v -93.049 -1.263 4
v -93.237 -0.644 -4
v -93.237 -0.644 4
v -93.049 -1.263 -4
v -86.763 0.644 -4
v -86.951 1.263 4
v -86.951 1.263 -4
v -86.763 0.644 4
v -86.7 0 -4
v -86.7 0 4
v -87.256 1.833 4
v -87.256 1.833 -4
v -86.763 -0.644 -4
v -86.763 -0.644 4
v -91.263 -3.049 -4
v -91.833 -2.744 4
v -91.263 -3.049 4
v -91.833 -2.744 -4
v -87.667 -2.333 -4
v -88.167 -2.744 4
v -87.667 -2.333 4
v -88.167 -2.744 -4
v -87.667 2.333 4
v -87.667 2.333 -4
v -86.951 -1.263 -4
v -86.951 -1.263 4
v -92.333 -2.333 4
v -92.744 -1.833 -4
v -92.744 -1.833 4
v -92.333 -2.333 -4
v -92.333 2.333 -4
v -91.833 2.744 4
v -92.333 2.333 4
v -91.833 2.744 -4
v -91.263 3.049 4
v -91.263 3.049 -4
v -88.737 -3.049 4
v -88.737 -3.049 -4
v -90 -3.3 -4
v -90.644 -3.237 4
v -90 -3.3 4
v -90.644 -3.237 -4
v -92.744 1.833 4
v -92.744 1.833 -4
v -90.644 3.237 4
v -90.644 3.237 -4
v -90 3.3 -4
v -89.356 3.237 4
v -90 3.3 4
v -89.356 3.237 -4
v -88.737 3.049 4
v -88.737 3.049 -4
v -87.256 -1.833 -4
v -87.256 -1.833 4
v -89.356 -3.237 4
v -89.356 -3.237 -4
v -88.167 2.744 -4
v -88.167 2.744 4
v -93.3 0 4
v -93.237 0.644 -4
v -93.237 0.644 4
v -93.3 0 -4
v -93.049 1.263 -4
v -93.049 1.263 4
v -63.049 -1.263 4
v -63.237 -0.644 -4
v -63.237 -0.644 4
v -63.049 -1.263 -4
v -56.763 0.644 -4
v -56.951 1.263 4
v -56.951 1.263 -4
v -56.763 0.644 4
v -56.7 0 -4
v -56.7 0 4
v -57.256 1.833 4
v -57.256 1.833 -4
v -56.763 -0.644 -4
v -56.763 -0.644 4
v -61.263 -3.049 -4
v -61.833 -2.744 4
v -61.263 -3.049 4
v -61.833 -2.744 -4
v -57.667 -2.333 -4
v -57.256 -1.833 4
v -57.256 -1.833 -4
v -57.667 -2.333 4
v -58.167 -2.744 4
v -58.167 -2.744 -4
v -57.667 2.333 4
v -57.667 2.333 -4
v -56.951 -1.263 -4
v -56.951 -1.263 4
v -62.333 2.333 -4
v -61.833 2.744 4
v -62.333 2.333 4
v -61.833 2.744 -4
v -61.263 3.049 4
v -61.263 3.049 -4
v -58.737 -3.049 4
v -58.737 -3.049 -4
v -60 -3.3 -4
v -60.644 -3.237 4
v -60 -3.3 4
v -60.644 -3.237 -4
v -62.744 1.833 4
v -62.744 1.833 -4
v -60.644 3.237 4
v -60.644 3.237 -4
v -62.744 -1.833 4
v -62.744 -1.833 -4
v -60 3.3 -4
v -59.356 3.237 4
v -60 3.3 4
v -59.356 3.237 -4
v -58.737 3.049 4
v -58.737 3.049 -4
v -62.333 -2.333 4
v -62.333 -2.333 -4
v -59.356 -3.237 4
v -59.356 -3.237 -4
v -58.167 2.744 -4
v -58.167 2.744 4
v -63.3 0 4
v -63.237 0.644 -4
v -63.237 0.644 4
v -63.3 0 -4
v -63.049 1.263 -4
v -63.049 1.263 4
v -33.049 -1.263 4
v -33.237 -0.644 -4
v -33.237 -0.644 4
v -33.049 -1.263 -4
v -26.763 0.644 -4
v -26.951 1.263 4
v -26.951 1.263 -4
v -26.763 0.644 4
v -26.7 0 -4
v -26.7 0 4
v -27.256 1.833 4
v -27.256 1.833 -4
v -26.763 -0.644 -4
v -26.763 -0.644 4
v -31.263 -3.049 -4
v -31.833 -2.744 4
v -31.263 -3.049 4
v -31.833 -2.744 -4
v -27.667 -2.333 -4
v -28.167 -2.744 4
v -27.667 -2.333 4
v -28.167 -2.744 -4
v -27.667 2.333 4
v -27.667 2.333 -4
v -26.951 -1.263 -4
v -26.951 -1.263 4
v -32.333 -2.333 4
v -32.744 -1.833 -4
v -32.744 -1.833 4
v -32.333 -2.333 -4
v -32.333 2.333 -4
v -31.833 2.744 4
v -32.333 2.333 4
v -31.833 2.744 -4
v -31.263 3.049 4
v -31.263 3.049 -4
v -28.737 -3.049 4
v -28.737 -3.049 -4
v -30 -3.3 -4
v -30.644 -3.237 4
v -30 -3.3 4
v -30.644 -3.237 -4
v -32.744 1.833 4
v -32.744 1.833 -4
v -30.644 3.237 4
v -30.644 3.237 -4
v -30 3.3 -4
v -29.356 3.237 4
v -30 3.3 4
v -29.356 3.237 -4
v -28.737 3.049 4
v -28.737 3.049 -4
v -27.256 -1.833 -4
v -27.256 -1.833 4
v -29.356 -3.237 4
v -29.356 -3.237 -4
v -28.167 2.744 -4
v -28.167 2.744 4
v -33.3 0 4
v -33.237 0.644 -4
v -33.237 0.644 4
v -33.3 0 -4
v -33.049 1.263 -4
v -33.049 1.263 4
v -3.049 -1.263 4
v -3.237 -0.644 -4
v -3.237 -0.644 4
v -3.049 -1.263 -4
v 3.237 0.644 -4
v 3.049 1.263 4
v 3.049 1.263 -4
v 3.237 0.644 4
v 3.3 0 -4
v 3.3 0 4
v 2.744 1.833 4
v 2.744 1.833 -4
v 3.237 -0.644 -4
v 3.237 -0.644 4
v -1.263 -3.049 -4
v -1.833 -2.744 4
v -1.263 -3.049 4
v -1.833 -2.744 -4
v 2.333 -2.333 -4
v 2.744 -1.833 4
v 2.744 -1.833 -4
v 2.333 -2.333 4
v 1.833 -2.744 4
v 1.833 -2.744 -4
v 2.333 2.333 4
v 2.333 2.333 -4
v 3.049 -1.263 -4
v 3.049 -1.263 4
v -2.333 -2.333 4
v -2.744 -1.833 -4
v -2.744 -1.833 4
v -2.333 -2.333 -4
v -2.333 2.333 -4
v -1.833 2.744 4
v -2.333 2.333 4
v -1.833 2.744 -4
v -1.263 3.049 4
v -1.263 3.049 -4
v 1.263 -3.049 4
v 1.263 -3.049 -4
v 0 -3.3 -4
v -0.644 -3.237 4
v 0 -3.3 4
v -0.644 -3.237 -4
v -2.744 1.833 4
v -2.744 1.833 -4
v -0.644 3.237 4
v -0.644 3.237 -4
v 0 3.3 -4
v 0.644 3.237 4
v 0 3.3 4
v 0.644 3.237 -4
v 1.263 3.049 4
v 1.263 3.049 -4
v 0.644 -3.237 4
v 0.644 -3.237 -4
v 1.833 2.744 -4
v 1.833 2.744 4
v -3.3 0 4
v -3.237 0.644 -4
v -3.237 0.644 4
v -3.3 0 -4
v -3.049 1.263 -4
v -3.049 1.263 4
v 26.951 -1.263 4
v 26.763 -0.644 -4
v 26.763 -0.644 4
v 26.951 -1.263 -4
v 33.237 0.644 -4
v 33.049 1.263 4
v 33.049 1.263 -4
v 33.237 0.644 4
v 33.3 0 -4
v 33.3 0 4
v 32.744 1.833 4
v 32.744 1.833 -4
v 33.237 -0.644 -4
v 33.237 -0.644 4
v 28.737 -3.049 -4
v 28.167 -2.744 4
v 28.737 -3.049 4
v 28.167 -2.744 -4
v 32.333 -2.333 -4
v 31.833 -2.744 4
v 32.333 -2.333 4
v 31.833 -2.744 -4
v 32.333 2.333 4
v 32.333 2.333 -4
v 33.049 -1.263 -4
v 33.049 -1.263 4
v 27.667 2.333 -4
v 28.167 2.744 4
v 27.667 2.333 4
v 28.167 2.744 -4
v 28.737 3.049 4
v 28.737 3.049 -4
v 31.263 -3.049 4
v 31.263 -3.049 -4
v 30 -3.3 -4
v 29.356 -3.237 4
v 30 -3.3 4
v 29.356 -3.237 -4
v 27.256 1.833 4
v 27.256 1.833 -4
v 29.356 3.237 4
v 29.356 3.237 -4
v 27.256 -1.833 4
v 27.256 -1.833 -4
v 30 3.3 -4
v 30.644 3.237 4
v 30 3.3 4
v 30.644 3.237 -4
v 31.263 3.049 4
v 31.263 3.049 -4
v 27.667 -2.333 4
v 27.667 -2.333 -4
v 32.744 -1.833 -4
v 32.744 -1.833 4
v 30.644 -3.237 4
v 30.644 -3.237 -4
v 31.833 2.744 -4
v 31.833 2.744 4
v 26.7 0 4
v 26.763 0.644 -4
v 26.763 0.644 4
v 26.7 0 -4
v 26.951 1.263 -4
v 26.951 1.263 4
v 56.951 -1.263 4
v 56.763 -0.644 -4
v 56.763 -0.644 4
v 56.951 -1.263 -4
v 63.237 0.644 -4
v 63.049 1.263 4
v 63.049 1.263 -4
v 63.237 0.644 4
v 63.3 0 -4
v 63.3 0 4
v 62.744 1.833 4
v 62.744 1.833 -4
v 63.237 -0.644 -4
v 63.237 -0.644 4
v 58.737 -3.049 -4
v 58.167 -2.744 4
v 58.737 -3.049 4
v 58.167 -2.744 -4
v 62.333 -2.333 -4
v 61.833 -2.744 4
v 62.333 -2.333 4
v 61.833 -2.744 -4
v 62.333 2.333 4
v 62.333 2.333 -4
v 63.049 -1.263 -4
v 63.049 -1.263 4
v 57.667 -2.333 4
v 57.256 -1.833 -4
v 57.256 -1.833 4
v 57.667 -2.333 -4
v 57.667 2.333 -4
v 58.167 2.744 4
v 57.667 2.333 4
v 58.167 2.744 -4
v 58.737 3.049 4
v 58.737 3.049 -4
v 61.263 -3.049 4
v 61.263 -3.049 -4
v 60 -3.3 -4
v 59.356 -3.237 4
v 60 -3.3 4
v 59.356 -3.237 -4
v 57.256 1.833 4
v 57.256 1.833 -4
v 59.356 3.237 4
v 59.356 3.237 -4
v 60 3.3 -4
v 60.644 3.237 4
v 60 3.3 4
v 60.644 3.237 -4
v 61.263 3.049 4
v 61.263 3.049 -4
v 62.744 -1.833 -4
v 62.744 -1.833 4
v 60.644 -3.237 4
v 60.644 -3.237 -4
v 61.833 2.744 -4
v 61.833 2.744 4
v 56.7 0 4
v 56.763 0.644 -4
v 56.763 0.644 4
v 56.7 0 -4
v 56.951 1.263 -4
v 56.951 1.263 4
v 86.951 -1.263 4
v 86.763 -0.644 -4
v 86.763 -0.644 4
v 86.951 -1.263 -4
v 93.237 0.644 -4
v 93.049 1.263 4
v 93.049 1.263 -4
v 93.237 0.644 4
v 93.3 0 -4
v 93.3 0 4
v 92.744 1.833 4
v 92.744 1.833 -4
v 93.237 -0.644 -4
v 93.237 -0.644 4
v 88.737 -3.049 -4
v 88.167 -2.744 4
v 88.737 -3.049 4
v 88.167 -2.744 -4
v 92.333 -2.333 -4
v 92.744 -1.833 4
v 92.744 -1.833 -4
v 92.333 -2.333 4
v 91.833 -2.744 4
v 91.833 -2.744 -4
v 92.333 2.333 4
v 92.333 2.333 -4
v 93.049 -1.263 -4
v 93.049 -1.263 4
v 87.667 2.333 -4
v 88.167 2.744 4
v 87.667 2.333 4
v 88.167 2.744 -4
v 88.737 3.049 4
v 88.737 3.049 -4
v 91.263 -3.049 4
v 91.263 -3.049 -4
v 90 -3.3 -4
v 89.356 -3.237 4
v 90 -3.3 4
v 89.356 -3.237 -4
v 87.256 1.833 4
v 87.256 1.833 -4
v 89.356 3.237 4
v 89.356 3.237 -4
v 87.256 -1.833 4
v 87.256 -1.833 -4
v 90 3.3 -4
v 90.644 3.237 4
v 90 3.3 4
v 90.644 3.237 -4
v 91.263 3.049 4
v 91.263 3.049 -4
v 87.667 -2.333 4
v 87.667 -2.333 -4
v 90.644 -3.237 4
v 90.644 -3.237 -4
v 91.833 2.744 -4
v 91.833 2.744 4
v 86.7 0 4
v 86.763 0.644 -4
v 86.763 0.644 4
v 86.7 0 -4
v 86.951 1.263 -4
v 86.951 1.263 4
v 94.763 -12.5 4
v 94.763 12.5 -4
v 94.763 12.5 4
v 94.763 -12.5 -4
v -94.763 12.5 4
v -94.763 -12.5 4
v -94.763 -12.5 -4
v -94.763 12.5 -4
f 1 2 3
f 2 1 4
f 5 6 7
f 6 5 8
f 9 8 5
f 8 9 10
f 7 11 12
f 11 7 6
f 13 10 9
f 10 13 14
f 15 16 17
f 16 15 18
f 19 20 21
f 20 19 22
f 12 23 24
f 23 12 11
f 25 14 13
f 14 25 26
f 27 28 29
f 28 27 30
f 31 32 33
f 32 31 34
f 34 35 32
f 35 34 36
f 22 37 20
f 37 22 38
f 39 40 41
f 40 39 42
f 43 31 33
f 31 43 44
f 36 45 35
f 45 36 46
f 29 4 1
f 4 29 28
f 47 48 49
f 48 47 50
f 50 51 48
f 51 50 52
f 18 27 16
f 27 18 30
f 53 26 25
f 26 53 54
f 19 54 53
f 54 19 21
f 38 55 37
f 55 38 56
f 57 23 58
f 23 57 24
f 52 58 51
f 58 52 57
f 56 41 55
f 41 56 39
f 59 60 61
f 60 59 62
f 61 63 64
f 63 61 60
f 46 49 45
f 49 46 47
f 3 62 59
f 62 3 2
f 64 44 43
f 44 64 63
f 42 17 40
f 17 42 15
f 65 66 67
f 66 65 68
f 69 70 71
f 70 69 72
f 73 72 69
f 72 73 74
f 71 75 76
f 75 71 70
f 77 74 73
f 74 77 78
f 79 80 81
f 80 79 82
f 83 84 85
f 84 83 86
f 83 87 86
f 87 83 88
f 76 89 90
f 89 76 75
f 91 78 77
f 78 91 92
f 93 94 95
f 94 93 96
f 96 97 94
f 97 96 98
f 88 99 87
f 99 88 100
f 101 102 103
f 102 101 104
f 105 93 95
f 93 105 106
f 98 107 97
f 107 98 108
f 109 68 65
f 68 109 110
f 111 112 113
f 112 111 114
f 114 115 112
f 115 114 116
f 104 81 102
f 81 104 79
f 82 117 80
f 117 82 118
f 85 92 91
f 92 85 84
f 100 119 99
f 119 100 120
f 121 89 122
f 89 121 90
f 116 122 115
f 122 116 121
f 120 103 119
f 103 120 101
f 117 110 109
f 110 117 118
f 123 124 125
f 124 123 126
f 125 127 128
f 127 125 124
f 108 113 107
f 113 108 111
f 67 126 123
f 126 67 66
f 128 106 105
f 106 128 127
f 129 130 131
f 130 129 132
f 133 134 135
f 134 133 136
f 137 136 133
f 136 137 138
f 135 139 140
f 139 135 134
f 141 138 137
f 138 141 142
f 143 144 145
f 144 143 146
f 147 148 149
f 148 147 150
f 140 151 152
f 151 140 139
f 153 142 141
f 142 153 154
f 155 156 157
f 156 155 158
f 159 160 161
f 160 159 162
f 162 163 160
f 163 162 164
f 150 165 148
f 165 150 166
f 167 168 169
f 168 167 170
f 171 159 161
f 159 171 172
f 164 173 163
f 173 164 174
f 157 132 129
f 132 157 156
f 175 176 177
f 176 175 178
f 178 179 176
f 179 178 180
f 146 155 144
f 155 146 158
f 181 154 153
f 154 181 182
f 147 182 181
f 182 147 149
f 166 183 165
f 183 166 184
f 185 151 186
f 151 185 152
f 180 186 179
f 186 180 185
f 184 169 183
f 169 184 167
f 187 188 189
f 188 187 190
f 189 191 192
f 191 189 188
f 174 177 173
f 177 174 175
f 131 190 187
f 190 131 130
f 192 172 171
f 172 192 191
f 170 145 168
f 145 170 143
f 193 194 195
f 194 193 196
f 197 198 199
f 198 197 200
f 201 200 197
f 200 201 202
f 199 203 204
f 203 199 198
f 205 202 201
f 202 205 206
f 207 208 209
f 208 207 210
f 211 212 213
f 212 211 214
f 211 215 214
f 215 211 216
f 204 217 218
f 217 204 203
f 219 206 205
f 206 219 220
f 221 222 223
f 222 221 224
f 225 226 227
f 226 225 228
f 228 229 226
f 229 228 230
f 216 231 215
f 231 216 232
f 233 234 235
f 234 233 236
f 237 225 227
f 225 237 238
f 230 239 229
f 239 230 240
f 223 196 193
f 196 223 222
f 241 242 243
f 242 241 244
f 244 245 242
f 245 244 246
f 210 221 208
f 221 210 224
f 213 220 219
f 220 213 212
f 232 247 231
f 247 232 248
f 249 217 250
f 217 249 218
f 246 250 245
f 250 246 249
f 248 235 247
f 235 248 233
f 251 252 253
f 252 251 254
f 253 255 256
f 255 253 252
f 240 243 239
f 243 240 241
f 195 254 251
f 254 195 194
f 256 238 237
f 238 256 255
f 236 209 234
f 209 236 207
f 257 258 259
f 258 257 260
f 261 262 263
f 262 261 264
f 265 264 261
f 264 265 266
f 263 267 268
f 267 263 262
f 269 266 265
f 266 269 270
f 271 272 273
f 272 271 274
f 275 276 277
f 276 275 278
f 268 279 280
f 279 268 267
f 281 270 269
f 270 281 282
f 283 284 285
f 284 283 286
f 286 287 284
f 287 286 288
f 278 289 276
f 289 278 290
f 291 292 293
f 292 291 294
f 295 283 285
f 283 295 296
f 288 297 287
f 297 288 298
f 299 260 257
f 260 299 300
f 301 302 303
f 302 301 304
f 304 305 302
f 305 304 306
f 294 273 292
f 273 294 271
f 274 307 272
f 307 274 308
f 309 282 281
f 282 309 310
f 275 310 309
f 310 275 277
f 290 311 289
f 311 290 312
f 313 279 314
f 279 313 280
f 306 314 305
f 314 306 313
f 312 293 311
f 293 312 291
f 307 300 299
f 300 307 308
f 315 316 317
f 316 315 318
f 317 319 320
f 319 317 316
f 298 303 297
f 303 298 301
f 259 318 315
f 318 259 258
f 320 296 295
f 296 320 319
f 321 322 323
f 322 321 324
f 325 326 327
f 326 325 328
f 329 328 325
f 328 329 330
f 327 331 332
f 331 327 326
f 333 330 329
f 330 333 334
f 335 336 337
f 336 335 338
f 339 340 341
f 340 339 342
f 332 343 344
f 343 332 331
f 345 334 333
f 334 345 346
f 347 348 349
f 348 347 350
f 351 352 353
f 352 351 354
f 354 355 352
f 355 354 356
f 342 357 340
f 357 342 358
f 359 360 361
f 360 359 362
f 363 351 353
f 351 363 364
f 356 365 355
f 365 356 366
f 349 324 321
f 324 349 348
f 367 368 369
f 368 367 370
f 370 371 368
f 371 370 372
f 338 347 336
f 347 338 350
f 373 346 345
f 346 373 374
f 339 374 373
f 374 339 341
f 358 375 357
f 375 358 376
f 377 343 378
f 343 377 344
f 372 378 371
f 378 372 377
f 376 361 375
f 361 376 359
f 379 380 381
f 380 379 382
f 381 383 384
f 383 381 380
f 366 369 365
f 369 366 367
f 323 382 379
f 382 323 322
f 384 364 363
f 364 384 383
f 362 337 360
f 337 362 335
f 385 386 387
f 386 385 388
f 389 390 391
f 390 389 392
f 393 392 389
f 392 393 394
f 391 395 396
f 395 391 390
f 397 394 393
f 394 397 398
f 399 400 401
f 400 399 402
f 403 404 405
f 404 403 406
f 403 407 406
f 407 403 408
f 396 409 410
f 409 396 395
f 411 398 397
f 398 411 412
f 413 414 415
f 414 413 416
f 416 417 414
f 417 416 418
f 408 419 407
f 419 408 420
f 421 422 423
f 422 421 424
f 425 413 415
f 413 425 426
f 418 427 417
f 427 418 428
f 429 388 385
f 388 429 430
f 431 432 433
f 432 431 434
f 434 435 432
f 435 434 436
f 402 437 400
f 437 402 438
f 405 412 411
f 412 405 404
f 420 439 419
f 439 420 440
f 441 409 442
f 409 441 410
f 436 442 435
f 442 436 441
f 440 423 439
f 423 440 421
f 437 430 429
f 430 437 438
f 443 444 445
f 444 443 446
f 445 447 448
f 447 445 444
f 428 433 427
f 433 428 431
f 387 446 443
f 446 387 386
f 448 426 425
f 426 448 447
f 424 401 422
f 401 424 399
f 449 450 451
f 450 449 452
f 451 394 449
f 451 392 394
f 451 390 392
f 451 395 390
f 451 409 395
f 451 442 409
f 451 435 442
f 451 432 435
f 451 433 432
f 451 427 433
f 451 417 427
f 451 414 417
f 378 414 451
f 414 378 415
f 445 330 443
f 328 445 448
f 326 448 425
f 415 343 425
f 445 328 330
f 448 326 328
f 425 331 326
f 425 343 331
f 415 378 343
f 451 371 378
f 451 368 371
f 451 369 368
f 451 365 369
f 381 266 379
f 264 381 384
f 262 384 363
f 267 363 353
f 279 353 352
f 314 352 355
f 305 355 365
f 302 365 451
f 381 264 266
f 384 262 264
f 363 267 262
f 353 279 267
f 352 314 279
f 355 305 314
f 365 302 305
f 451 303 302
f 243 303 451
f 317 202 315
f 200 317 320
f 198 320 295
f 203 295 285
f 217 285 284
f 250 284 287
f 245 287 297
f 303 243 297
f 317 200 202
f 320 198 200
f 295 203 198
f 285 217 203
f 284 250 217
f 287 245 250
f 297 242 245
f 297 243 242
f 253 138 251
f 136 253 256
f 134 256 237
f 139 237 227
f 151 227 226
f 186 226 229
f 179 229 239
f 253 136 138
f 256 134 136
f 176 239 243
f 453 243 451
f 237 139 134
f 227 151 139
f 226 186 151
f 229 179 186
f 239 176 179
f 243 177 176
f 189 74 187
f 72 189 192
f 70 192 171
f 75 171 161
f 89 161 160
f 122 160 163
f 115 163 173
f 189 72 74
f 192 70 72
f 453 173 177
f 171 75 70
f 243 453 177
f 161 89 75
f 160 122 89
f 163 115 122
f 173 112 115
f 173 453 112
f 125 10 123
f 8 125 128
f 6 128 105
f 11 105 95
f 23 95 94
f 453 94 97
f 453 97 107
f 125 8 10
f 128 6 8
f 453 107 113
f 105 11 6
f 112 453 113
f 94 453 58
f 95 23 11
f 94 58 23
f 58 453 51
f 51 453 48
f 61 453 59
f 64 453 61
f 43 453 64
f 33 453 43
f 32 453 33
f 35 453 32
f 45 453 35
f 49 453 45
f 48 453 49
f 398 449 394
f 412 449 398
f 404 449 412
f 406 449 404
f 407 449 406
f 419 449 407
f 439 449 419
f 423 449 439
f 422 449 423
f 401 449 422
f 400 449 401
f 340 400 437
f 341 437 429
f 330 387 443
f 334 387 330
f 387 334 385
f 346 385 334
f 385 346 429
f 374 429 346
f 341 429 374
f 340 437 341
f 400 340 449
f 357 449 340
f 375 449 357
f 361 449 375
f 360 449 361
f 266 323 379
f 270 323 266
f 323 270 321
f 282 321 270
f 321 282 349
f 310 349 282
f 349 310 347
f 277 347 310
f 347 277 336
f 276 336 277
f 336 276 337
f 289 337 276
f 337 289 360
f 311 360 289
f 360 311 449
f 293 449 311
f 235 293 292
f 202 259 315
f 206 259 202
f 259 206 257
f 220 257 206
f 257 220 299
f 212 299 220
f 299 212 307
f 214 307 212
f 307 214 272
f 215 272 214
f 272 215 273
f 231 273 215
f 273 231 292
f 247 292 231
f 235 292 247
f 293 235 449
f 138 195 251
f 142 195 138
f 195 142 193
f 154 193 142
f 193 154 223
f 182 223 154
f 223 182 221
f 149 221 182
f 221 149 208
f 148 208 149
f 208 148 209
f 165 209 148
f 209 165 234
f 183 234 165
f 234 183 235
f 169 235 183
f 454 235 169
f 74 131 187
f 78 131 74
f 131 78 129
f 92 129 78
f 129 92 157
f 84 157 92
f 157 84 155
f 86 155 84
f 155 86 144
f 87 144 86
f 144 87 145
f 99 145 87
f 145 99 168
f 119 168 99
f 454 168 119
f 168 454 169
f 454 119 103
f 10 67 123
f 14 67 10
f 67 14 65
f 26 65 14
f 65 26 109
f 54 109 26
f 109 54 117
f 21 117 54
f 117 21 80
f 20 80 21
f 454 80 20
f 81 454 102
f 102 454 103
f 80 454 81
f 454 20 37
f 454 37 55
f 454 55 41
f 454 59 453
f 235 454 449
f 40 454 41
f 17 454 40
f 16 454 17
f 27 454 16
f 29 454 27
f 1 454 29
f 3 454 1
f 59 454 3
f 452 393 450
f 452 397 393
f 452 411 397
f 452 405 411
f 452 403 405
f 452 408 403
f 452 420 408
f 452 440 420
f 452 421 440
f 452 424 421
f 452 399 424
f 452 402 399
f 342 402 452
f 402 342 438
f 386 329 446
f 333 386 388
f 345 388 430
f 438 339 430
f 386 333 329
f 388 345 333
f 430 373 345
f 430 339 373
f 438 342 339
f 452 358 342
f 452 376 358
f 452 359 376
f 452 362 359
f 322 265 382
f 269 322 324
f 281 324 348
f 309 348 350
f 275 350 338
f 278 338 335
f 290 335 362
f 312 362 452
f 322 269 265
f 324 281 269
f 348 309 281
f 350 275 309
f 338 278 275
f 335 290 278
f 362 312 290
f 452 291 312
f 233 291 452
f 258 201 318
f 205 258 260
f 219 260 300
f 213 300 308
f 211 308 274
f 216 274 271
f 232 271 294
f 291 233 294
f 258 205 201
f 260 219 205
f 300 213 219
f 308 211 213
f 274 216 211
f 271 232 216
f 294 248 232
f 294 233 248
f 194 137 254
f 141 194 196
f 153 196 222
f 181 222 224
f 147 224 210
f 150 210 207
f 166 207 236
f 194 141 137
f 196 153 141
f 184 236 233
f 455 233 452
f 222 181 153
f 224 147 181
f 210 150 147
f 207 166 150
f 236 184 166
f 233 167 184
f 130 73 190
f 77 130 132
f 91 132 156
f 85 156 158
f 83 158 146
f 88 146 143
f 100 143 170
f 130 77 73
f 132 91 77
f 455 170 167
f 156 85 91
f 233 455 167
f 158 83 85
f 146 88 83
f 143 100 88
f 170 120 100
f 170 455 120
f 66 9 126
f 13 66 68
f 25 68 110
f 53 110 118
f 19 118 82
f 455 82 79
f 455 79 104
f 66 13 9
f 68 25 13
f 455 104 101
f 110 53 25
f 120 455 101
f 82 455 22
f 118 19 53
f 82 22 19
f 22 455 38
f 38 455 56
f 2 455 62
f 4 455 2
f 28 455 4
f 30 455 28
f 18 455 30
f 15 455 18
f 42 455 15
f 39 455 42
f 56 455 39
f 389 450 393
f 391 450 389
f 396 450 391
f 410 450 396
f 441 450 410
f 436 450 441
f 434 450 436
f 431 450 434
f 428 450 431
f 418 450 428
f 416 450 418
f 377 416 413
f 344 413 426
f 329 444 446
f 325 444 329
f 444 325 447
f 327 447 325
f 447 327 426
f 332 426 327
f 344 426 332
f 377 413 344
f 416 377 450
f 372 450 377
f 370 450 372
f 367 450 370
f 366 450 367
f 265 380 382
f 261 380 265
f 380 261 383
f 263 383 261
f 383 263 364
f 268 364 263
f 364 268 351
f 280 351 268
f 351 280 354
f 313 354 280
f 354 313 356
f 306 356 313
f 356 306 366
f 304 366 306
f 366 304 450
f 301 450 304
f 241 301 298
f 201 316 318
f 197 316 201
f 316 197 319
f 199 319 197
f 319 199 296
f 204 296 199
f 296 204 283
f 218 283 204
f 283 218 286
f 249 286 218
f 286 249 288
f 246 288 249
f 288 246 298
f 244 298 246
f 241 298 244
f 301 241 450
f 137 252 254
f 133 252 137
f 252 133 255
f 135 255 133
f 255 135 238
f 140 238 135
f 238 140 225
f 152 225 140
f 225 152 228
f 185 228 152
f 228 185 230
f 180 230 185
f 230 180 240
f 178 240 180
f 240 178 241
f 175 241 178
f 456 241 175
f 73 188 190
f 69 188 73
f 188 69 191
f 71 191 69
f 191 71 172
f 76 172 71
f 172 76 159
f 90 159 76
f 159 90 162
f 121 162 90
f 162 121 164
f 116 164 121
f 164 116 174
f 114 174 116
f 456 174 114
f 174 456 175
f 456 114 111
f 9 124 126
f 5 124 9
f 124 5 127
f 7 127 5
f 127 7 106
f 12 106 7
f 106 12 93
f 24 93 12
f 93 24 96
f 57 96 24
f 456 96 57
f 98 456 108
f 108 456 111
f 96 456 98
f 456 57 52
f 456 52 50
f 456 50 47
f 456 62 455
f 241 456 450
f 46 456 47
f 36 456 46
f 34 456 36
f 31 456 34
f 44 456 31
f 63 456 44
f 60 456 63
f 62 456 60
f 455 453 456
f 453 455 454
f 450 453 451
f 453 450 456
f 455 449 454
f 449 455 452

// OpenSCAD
$fn = 32;

// ----------------------------------------------------------------------
// Hole bar, 7 x Ø6.6
// skip layout, 4.7625 mm edge offset
// ----------------------------------------------------------------------

// --- parameters (mm) ---
bar_w = 25;       // bar width (Y)
bar_t = 8;        // bar thickness (Z)
holes = 7;        // holes per row
hole_d = 6.6;     // hole diameter
edge = 4.763;     // offset from the bar end to the first hole
grid_pitch = 15;  // grid the bar was laid out on

// --- derived feature positions (mm) ---
pitch = grid_pitch * 2;       // = 30   holes sit every other grid slot
span = (holes - 1) * pitch;   // = 180   distance between the end holes
bar_l = span + 2 * edge;      // = 189.53   overall bar length
start_x = -bar_l / 2 + edge;  // = -90   X of the first hole
feature_centers = [
  [start_x + 0 * pitch, 0],
  [start_x + 1 * pitch, 0],
  [start_x + 2 * pitch, 0],
  [start_x + 3 * pitch, 0],
  [start_x + 4 * pitch, 0],
  [start_x + 5 * pitch, 0],
  [start_x + 6 * pitch, 0]
];   // hole centres of the first row

// bar with one row of holes, drilled from feature_centers
difference() {
  translate([-bar_l / 2, -bar_w / 2, -bar_t / 2]) cube([bar_l, bar_w, bar_t]);
  for (centre = feature_centers)
    translate([centre[0], centre[1], 0])
      cylinder(d = hole_d, h = bar_t + 2, center = true);
}
